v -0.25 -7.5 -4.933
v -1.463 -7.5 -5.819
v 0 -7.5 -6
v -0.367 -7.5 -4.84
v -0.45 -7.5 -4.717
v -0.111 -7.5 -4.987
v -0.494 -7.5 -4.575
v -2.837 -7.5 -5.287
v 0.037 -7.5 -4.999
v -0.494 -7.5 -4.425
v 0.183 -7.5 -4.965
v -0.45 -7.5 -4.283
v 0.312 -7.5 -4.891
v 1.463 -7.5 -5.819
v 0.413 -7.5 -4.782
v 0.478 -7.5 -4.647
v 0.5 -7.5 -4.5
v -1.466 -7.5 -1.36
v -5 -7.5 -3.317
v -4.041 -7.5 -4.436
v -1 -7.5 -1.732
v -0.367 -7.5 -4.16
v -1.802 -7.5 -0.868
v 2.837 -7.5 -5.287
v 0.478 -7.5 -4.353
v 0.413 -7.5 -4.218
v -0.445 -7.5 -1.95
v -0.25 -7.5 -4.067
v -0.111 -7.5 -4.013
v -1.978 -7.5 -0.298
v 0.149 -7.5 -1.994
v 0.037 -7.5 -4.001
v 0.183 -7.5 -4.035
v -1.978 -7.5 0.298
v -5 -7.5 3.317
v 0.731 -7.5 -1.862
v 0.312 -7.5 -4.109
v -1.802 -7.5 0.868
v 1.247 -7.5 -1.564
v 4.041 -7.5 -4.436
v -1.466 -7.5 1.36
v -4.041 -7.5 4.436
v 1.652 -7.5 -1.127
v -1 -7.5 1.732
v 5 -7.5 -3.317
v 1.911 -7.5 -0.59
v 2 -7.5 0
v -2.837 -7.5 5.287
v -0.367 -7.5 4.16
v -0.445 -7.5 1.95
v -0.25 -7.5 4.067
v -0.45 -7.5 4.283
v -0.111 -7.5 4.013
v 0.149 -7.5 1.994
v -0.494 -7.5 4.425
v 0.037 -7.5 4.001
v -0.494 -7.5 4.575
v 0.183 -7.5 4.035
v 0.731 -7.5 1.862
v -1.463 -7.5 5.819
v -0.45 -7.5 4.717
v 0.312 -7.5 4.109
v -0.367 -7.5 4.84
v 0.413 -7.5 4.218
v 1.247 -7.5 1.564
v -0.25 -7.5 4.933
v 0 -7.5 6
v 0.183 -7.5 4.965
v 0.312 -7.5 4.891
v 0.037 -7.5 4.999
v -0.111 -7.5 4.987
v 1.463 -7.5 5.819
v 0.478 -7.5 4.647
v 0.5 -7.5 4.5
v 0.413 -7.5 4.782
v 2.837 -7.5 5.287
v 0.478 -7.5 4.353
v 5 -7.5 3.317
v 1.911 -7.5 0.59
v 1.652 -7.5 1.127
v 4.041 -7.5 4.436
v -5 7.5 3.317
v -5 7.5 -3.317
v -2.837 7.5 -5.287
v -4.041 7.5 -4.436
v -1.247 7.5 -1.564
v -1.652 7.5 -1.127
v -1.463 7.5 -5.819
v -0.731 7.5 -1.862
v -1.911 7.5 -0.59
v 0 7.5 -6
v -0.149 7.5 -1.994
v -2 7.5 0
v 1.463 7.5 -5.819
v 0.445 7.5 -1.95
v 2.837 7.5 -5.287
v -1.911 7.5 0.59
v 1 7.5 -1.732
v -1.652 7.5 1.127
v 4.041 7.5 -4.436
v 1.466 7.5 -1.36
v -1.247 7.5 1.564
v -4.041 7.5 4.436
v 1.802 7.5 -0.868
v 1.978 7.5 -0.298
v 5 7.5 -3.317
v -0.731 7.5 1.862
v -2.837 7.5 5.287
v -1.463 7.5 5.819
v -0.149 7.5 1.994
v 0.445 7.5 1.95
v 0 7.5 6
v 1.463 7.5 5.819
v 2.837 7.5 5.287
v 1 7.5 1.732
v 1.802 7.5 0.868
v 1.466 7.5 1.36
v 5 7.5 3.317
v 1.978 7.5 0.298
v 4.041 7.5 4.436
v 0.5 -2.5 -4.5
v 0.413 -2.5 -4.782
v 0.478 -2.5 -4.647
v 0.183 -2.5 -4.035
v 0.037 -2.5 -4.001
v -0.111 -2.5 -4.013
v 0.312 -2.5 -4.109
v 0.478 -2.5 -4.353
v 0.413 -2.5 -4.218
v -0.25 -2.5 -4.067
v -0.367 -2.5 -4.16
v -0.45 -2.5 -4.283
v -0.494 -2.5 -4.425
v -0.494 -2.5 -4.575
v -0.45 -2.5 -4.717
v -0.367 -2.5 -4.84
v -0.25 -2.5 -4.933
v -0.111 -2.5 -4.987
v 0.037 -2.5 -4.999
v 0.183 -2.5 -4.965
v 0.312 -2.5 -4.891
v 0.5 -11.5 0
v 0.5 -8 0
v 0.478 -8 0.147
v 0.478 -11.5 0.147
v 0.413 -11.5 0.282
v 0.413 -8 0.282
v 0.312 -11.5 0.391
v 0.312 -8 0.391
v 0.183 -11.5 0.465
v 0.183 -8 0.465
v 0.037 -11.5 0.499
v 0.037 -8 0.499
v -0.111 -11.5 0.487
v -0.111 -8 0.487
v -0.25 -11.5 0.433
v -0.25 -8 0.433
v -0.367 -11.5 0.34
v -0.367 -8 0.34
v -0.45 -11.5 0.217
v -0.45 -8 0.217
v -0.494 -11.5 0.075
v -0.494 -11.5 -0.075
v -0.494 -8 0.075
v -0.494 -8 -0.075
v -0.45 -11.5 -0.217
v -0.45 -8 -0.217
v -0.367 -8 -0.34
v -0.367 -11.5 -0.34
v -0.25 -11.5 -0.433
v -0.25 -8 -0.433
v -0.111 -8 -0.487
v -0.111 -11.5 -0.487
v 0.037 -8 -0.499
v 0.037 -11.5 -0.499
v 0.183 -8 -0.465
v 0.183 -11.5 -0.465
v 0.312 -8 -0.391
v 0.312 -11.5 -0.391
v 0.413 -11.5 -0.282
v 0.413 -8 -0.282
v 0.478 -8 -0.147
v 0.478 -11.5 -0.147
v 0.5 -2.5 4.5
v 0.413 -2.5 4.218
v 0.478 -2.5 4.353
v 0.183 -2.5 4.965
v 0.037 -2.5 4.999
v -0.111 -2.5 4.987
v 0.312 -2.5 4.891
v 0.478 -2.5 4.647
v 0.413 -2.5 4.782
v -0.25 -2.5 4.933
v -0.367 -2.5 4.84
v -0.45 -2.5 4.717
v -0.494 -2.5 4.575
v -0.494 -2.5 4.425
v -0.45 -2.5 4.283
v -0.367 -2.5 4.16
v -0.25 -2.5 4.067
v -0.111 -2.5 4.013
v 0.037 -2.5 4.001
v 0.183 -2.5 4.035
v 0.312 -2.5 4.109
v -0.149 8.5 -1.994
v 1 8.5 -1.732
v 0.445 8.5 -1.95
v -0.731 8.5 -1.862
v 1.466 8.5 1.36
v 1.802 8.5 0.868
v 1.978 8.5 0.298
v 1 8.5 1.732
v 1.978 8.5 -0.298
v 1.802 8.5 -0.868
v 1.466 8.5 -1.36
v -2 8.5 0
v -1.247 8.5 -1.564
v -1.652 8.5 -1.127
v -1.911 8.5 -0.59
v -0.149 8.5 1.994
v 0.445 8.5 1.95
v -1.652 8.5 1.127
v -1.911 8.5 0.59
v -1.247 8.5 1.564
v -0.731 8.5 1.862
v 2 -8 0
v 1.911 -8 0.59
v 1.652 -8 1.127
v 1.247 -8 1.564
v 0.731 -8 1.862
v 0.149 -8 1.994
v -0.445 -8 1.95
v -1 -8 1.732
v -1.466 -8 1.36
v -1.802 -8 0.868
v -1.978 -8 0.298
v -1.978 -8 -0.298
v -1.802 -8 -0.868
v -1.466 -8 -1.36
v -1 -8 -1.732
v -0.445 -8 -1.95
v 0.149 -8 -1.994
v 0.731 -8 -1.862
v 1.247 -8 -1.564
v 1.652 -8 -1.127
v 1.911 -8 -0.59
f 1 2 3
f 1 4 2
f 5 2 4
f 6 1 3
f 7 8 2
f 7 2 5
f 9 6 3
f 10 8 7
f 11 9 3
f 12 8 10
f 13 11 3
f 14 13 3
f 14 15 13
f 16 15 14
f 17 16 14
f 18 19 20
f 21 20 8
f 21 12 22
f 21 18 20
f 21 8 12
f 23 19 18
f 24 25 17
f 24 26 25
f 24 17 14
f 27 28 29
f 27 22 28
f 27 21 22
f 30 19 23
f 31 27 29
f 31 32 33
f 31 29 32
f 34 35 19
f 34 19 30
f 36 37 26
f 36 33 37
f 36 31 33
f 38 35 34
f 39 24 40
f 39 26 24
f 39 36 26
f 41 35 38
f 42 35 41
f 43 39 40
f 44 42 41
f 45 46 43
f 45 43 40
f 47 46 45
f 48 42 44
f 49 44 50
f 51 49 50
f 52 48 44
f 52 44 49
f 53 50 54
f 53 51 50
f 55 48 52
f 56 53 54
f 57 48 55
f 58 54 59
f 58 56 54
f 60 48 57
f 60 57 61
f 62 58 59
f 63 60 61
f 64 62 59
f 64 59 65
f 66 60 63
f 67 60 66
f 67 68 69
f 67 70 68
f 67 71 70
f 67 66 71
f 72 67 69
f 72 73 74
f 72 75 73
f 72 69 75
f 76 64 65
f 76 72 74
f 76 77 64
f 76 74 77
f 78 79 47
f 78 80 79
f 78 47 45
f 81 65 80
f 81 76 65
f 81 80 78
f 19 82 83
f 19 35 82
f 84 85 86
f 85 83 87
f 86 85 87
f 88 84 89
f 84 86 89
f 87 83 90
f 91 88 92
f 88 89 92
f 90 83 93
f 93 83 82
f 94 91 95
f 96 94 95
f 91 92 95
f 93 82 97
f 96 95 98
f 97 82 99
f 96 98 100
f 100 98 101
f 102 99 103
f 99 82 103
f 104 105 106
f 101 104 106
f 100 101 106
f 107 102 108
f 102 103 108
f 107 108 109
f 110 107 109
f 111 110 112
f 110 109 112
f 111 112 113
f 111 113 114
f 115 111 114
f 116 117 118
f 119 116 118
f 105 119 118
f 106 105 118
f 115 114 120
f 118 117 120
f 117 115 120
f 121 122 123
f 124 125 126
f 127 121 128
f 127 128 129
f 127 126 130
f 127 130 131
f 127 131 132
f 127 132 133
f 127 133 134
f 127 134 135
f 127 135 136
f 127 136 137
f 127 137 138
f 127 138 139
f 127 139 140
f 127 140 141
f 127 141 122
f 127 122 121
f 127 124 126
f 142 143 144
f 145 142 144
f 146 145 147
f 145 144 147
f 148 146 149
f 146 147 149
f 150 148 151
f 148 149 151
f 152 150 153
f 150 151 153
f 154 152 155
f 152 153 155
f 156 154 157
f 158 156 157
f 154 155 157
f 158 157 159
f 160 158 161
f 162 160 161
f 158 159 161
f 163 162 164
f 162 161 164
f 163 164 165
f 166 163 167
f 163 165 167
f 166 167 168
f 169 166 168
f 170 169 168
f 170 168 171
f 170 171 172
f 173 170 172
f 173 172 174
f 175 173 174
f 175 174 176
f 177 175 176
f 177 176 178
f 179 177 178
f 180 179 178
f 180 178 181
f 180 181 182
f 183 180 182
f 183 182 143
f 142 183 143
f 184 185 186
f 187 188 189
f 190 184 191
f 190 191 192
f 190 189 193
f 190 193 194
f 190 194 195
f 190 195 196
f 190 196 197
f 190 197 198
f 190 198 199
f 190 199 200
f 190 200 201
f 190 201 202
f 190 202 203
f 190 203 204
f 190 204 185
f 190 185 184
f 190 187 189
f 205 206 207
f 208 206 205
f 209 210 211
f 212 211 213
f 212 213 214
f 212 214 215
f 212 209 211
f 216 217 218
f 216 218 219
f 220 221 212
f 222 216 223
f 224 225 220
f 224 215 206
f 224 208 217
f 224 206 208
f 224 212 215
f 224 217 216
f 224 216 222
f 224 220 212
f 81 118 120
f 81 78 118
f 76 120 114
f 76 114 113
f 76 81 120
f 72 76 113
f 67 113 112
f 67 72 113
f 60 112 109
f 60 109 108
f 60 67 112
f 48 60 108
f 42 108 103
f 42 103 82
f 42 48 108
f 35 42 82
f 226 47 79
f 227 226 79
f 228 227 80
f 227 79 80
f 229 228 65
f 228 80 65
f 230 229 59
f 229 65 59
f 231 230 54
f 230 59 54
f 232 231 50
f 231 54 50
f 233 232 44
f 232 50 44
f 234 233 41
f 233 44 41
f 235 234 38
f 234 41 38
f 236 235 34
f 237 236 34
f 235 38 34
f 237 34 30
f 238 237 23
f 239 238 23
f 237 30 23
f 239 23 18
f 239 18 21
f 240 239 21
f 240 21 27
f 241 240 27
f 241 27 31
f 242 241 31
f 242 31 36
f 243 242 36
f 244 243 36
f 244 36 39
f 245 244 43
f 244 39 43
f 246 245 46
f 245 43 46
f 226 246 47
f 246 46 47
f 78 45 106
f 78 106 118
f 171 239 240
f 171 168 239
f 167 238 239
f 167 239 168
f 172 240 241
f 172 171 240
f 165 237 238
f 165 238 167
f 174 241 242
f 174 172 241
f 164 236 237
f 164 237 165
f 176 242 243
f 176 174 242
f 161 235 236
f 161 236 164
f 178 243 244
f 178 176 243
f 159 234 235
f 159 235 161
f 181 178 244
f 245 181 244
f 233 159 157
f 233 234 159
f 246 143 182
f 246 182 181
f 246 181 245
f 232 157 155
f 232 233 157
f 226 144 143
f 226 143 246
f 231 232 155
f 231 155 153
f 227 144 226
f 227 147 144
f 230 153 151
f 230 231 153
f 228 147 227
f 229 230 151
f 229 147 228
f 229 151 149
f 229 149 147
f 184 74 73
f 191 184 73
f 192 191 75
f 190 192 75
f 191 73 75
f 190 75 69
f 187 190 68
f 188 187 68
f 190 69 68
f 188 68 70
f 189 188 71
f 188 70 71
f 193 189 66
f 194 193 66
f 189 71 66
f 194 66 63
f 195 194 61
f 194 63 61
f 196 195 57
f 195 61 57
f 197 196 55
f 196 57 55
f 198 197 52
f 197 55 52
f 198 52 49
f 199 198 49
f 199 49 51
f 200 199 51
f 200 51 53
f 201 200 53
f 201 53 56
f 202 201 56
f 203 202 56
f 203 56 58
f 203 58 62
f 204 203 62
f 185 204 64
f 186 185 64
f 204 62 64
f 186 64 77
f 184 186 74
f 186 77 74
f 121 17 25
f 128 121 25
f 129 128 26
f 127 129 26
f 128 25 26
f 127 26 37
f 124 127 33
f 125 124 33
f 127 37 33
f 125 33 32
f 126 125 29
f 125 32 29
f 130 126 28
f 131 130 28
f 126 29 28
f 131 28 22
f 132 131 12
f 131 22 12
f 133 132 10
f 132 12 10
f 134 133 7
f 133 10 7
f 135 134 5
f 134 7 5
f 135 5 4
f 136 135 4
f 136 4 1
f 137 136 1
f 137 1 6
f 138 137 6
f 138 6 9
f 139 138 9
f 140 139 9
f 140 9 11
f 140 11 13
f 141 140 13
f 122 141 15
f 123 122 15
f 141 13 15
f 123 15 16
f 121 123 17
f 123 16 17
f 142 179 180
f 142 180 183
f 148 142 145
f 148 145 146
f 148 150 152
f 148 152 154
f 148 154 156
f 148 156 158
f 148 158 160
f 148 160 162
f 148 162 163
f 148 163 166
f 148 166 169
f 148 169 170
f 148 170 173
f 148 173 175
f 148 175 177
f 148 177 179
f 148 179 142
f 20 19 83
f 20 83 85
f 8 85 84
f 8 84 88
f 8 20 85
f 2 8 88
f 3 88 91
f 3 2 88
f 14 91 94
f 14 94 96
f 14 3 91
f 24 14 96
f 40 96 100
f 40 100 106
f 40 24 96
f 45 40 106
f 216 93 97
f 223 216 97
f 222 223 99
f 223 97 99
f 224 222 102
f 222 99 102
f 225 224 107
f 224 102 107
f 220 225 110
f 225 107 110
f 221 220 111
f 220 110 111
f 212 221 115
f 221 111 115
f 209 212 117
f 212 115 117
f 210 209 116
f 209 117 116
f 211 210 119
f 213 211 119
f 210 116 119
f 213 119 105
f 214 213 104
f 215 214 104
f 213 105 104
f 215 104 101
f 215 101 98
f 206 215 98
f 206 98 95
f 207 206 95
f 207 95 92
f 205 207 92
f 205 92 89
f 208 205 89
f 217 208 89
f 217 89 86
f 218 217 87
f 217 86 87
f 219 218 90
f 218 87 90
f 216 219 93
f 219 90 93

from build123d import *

# Parameters (mm, degrees)
F1_DEPTH = 7.5
F2_R     = 0.5
F3_DEPTH = 4
F4_R     = 2
F5_DEPTH = 0.5
F6_R     = 2
F7_DEPTH = 1
F8_R     = 0.5
F9_DEPTH = 5


with BuildPart() as f1:
    # F0 (on Front) → F1 (new body, symmetric)
    with BuildSketch(Plane.XZ):
        with BuildLine():
            Line((-5, 3.316625), (-5, -3.316625))
            ThreePointArc((-5, -3.316625), (0, -6), (5, -3.316625))
            Line((5, -3.316625), (5, 3.316625))
            ThreePointArc((5, 3.316625), (0, 6), (-5, 3.316625))
        make_face()
    extrude(amount=F1_DEPTH, both=True)

    # F2 (on face) → F3 (join)
    with BuildSketch(Plane.XZ.offset(7.5)):
        Circle(F2_R)
    extrude(amount=F3_DEPTH)

    # F4 (on face) → F5 (join)
    with BuildSketch(Plane.XZ.offset(7.5)):
        Circle(F4_R)
    extrude(amount=F5_DEPTH)

    # F6 (on face) → F7 (join)
    with BuildSketch(Plane(origin=(0, 7.5, 0), x_dir=(-1, 0, 0), z_dir=(0, 1, 0))):
        Circle(F6_R)
    extrude(amount=F7_DEPTH)

    # F8 (on face) → F9 (cut)
    with BuildSketch(Plane.XZ.offset(7.5)):
        with Locations((0, 4.5)):
            Circle(F8_R)
        with Locations((0, -4.5)):
            Circle(F8_R)
    extrude(amount=-F9_DEPTH, mode=Mode.SUBTRACT)


solid = f1.part
